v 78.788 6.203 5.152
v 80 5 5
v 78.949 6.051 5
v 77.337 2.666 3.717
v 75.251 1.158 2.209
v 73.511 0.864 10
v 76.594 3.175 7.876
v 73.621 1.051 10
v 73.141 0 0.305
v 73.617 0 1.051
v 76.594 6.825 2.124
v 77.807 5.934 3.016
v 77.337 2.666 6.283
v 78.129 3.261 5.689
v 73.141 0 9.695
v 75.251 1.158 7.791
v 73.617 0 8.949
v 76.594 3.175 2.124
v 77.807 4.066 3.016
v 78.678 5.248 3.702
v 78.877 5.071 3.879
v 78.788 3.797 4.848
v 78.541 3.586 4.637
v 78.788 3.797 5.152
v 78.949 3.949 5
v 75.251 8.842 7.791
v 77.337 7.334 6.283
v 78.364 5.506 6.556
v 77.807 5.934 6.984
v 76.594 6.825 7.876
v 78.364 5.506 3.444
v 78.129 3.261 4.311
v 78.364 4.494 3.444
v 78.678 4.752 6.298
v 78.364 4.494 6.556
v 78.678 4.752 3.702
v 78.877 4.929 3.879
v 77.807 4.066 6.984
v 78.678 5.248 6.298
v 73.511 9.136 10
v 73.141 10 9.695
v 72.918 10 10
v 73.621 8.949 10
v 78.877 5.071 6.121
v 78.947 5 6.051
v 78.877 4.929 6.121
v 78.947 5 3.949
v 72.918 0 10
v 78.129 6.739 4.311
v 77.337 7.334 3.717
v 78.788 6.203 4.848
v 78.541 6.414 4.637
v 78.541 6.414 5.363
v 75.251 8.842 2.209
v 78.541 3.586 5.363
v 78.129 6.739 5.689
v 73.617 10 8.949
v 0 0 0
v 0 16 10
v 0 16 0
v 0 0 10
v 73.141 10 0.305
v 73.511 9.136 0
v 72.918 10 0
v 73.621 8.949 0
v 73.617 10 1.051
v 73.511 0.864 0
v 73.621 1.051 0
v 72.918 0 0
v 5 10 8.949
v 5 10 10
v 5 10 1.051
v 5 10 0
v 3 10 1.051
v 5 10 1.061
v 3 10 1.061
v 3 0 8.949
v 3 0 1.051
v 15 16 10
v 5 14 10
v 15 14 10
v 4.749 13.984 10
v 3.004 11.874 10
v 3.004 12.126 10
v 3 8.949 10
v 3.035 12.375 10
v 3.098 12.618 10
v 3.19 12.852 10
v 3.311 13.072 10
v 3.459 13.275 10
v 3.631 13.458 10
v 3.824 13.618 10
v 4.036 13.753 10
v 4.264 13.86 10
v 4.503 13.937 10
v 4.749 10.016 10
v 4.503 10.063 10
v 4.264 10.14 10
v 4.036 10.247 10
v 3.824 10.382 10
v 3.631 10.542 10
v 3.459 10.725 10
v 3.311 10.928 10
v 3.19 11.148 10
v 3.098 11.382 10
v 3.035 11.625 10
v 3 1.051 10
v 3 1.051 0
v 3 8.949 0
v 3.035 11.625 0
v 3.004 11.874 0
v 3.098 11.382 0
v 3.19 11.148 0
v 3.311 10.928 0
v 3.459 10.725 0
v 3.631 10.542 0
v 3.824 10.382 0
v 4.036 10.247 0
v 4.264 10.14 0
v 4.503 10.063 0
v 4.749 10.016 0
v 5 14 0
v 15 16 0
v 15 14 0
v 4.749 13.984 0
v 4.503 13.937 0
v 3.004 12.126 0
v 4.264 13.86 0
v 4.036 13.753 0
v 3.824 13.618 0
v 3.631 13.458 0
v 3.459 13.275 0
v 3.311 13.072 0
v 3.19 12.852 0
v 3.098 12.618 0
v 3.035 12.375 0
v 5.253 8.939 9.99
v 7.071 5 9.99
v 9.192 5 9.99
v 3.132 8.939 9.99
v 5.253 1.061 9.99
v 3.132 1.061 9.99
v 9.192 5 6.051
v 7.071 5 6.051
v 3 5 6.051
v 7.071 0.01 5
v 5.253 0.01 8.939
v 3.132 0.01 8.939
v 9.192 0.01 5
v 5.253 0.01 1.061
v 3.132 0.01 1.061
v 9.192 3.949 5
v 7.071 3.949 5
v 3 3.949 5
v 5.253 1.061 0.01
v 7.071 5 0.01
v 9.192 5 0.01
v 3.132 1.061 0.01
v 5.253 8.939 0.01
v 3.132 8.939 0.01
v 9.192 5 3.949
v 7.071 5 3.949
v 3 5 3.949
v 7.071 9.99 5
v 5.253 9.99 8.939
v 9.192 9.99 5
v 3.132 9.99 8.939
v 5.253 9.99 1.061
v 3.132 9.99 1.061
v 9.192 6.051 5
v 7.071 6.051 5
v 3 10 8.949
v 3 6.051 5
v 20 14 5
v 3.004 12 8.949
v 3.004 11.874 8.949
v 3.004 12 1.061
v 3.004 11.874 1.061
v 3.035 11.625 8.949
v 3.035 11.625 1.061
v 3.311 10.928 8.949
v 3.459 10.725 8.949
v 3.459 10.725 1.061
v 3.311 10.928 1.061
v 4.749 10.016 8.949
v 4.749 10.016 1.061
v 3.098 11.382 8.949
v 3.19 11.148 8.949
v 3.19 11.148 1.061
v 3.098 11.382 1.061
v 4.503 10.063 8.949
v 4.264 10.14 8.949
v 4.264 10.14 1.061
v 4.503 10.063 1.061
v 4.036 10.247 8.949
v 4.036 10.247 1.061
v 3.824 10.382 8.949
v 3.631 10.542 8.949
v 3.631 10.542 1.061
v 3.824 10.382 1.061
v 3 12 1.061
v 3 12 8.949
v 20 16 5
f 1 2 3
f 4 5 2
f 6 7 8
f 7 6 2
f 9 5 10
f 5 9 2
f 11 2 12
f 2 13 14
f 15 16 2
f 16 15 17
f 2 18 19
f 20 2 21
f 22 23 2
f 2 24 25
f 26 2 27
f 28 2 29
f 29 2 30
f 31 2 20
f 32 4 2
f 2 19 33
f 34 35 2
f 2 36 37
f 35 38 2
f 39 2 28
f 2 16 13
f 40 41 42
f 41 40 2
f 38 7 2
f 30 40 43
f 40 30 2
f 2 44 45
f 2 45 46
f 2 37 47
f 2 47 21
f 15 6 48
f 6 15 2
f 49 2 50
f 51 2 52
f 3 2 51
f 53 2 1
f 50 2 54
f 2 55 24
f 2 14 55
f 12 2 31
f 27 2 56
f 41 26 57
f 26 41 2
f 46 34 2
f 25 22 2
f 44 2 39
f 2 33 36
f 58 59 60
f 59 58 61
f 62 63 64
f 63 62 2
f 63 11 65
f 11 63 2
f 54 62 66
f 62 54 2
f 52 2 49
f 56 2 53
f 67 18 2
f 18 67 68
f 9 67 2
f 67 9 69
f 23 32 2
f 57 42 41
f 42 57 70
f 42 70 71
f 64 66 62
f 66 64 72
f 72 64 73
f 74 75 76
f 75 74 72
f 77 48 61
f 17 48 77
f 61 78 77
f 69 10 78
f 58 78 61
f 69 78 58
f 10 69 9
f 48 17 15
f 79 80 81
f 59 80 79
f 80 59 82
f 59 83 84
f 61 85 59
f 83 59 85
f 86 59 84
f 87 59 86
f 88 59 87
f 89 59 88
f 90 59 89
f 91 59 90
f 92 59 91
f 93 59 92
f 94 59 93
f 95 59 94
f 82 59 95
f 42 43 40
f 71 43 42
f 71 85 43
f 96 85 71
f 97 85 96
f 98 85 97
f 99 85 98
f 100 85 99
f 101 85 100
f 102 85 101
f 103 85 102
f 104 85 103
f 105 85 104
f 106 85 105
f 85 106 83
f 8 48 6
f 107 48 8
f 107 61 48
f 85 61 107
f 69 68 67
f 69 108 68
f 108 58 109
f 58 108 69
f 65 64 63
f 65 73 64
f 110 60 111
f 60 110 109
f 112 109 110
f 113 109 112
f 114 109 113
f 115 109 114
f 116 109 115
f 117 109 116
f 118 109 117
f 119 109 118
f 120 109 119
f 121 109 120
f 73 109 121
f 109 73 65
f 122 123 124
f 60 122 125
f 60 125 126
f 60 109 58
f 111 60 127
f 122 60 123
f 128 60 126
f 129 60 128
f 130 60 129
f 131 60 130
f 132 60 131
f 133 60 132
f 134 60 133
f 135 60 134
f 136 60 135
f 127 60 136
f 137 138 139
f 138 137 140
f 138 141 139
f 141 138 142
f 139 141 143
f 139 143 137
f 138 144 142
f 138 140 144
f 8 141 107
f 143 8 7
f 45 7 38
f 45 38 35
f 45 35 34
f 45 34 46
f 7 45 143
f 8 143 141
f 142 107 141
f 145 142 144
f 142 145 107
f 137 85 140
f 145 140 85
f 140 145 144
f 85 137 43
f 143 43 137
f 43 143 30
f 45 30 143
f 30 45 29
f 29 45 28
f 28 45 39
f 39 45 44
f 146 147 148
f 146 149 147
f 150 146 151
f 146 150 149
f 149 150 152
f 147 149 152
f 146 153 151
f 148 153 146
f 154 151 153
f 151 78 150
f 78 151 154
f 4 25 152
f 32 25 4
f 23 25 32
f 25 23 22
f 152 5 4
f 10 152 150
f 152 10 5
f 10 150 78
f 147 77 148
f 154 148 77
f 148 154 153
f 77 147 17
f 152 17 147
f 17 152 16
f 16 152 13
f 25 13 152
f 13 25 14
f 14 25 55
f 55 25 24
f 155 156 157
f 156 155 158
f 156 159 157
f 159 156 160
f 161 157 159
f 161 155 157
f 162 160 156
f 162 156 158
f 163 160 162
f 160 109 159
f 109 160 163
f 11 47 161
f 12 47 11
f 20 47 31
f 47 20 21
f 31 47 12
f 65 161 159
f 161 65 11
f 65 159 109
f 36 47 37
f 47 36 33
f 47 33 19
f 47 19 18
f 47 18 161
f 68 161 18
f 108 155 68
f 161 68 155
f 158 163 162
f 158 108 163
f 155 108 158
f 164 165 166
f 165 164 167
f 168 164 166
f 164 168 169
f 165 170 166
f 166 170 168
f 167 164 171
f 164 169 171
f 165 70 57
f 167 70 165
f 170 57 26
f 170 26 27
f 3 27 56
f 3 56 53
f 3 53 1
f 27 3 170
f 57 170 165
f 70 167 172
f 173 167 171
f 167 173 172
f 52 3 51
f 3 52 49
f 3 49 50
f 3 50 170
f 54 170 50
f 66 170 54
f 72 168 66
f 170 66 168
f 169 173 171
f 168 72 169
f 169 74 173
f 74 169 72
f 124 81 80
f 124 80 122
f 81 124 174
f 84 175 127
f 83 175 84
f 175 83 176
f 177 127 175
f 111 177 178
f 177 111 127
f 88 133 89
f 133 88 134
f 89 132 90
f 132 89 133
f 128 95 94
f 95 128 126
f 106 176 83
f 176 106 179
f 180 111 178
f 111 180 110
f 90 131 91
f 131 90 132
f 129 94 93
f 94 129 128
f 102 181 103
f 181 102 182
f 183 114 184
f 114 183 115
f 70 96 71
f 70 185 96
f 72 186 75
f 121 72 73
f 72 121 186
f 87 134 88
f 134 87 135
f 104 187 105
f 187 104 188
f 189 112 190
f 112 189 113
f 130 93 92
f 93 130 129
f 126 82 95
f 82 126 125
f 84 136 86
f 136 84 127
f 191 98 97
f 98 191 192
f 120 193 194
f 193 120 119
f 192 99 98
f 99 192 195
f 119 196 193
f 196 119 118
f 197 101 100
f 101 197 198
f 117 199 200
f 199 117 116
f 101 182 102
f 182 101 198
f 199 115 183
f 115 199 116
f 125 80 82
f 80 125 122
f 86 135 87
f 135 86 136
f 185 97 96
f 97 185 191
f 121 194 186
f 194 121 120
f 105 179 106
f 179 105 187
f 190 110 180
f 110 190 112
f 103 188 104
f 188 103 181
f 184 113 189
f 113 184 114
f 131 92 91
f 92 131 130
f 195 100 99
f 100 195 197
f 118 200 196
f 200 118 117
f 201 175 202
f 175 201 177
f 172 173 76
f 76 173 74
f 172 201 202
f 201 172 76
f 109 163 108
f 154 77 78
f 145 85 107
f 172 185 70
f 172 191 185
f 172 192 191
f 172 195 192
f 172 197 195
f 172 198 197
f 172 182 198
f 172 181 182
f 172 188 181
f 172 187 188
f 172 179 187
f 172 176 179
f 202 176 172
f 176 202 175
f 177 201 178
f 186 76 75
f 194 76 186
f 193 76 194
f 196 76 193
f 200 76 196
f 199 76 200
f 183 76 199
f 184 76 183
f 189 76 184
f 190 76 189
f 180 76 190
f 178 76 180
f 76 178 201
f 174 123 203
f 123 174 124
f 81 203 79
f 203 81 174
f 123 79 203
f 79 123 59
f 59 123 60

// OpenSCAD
// ************* Credits part *************

// Programmed by Fryns - July 2014

// ************* Declaration part *************

/* [Peg] */
TopThickness=3;
PegLength=80;
PegWidth=10;
PegThickness=1.5;

/* [Hook] */
HookLength=20;
HookSpace=4;
HookThickness=2;

/* [Hidden] */
Manifoldfix=0.01;

// preview[view:north, tilt:top]

// ************* Executable part *************

rotate([90,0,90])
Assembly();


// ************* Module part *************
module Assembly(){
	cube([PegWidth+HookThickness+HookSpace,PegWidth,TopThickness]); // peg top
	intersection(){
		PegSolid();
		PegSkeleton();
	}
	PegHook();
}

module PegSolid(){	// makes solid version of peg
	intersection(){	// makes peg point
		translate([PegWidth/2,PegWidth/2,0])
			cylinder(h = PegLength, r1 = PegLength, r2 = 0,$fn=50, center = false); 
		cube([PegWidth,PegWidth,PegLength]);
	}
}

module PegHook(){
	difference(){	// makes hook curve
		translate([PegWidth,0,0])
			cube([HookSpace,PegWidth,HookLength]);
		translate([PegWidth+HookSpace/2,PegWidth/2,HookSpace/2+TopThickness])
			rotate([90,0,0])
				cylinder(h = PegWidth+Manifoldfix, r = HookSpace/2,$fn=50 ,center = true);
		translate([PegWidth,0,HookSpace/2+TopThickness])
			cube([HookSpace,PegWidth,HookLength]);
		translate([PegWidth,PegThickness/2*sqrt(2),TopThickness])
			cube([HookSpace/2,PegWidth-PegThickness*sqrt(2)+Manifoldfix,HookLength]);
	}

	intersection(){	// makes hook 
		translate([PegWidth+HookSpace,PegWidth/2,-HookLength])
			rotate([45,0,0])
		cube([HookThickness,HookLength*sqrt(2),HookLength*sqrt(2)]);
		translate([PegWidth+HookSpace,0,0])
		cube([HookThickness,PegWidth,HookLength]);
	}
}

module PegSkeleton(){	// makes peg skeleton from 4 quarters
	translate([0,-Manifoldfix,0])
	PegSkeletonQuarter();
	translate([PegWidth+Manifoldfix,0,0])
		rotate([0,0,90])
	PegSkeletonQuarter();
	translate([PegWidth,PegWidth+Manifoldfix,0])
		rotate([0,0,180])
	PegSkeletonQuarter();
	translate([-Manifoldfix,PegWidth,0])
		rotate([0,0,-90])
	PegSkeletonQuarter();
}

module PegSkeletonQuarter(){	// makes peg skeleton quarter
	intersection(){
		translate([PegWidth/2,PegWidth/2,0])
			rotate([0,0,45])
		cube([PegWidth,PegWidth,PegLength]);
		PegSkeletonIntermidiate();
	}
}

module PegSkeletonIntermidiate(){	// makes peg skeleton structure for quarter
	translate([PegWidth/2,PegWidth/2,(PegWidth+TopThickness)/2*sqrt(2)])
		rotate([-90,0,0])
			rotate([0,0,45])
	difference(){		// makes peg cross
		cube([PegWidth,PegWidth,PegWidth/2]);
		translate([PegThickness,PegThickness,0])
			cube([PegWidth,PegWidth,PegWidth]);

	}
	translate([PegWidth/2,PegWidth/2,0])
		rotate([0,0,45])
	difference(){		// makes peg cross
		cube([PegWidth,PegWidth,PegLength]);
		translate([PegThickness/2,PegThickness/2,0])
				cube([PegWidth,PegWidth,PegLength]);
	}
}
